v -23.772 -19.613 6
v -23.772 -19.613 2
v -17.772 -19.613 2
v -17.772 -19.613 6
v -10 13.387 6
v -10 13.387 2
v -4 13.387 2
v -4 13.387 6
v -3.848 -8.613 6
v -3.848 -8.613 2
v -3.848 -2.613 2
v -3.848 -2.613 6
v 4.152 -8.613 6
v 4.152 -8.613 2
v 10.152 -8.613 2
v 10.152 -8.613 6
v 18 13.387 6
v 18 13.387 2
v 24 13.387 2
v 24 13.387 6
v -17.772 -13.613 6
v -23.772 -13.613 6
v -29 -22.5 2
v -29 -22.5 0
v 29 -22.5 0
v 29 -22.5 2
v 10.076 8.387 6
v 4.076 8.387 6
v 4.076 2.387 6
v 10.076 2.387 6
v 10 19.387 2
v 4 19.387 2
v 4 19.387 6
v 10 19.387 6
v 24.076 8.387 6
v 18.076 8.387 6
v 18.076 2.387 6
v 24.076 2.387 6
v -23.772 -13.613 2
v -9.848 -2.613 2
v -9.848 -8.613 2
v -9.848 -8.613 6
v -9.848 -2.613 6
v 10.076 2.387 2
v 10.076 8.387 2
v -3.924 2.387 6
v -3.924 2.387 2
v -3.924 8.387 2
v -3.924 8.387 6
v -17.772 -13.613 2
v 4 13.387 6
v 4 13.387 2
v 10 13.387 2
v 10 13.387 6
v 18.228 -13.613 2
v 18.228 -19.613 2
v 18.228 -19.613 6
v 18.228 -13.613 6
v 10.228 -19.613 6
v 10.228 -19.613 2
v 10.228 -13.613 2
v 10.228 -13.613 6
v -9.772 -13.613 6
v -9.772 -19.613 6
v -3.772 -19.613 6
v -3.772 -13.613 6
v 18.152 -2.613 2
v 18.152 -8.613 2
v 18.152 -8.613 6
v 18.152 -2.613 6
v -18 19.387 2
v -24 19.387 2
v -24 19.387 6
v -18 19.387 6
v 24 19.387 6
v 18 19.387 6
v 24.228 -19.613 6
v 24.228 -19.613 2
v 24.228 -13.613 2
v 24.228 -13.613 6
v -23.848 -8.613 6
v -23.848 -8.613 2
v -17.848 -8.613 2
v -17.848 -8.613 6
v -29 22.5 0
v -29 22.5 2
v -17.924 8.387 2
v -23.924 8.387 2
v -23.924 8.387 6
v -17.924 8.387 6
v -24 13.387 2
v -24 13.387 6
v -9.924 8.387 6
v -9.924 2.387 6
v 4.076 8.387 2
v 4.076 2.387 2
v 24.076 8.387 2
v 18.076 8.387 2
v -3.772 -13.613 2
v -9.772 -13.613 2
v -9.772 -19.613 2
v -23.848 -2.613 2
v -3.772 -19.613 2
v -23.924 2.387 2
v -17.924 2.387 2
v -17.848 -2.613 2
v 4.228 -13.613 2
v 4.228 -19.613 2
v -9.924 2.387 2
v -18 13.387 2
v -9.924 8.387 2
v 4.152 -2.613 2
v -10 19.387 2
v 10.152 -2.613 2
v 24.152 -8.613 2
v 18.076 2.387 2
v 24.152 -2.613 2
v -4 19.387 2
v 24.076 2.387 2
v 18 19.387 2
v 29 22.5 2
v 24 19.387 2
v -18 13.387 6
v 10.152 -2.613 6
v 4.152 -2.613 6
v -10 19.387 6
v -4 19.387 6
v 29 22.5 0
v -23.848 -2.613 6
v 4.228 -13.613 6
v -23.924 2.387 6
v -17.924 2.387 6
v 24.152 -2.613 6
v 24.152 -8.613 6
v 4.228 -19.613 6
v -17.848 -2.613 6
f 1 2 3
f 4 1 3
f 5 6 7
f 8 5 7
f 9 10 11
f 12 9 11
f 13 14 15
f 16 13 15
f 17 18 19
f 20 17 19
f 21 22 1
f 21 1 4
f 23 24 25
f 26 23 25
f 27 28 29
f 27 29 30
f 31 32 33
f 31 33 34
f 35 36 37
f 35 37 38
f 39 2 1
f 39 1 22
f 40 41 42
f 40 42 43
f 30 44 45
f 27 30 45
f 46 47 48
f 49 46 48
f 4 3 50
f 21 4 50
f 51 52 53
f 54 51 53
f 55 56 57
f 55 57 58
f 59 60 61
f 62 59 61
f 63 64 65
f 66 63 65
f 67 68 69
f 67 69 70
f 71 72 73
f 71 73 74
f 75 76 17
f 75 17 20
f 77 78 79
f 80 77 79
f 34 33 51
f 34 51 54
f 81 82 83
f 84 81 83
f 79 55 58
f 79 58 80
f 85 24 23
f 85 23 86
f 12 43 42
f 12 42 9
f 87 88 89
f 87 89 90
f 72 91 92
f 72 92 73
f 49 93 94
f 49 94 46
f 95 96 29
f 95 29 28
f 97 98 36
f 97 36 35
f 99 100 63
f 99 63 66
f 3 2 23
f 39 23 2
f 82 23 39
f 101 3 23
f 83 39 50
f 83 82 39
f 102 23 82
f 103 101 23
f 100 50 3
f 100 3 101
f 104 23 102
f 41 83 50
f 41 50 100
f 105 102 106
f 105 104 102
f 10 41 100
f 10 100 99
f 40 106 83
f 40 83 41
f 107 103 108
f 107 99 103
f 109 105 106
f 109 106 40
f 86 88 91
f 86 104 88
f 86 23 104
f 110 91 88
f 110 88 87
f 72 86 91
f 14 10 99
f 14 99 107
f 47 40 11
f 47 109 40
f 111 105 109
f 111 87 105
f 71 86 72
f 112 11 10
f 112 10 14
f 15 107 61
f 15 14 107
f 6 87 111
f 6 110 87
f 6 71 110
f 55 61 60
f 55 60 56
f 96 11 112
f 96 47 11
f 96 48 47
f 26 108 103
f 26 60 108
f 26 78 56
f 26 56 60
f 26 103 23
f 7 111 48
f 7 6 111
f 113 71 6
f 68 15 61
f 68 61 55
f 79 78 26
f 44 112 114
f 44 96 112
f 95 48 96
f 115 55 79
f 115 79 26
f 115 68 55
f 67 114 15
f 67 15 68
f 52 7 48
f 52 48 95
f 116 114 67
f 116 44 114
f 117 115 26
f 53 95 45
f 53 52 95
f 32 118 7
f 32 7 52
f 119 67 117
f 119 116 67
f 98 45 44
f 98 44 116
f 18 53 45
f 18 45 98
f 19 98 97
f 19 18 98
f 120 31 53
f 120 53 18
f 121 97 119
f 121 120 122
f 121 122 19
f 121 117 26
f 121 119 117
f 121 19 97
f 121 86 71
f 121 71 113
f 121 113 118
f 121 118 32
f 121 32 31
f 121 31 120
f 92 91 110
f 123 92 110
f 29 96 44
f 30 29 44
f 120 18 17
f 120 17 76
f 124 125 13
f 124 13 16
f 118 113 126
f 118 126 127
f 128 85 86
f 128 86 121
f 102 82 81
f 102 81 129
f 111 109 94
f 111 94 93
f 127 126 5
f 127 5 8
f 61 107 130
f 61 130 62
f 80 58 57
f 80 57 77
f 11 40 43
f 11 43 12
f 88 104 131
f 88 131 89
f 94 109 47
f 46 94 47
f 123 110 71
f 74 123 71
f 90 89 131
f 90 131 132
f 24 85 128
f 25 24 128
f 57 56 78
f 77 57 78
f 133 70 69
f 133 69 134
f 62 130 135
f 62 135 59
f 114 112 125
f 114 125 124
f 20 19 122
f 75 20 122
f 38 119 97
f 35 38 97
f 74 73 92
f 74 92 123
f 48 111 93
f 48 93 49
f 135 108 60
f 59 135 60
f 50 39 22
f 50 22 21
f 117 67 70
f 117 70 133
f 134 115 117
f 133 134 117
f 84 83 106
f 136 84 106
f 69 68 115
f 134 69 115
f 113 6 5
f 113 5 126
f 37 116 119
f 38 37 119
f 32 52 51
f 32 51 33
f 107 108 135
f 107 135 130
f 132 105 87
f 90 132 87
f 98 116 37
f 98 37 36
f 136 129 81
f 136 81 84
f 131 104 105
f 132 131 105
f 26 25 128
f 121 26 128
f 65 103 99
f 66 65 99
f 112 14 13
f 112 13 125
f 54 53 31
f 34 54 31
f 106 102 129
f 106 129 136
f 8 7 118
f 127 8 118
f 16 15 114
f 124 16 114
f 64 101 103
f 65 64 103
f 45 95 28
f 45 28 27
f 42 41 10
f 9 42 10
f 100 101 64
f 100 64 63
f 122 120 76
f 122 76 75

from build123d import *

# Parameters (mm, degrees)
F0_W     = 58
F0_H     = 45
F1_DEPTH = 2
F2_W     = 6
F2_H     = 6
F3_DEPTH = 4


with BuildPart() as f1:
    # F0 (on Top) → F1 (new body)
    with BuildSketch(Plane.XY):
        Rectangle(F0_W, F0_H)
    extrude(amount=F1_DEPTH)

    # F2 (on face) → F3 (join)
    with BuildSketch(Plane.XY.offset(2)):
        with Locations((-21, 16.386651)):
            Rectangle(F2_W, F2_H)
        with Locations((-7, 16.386651)):
            Rectangle(F2_W, F2_H)
        with Locations((7, 16.386651)):
            Rectangle(F2_W, F2_H)
        with Locations((21, 16.386651)):
            Rectangle(F2_W, F2_H)
        with Locations((-20.923837, 5.386915)):
            Rectangle(F2_W, F2_H)
        with Locations((-6.923837, 5.386915)):
            Rectangle(F2_W, F2_H)
        with Locations((7.076163, 5.386915)):
            Rectangle(F2_W, F2_H)
        with Locations((21.076163, 5.386915)):
            Rectangle(F2_W, F2_H)
        with Locations((-20.847673, -5.612822)):
            Rectangle(F2_W, F2_H)
        with Locations((-6.847673, -5.612822)):
            Rectangle(F2_W, F2_H)
        with Locations((7.152327, -5.612822)):
            Rectangle(F2_W, F2_H)
        with Locations((21.152327, -5.612822)):
            Rectangle(F2_W, F2_H)
        with Locations((-20.77151, -16.612558)):
            Rectangle(F2_W, F2_H)
        with Locations((-6.77151, -16.612558)):
            Rectangle(F2_W, F2_H)
        with Locations((7.22849, -16.612558)):
            Rectangle(F2_W, F2_H)
        with Locations((21.22849, -16.612558)):
            Rectangle(F2_W, F2_H)
    extrude(amount=F3_DEPTH)


solid = f1.part
